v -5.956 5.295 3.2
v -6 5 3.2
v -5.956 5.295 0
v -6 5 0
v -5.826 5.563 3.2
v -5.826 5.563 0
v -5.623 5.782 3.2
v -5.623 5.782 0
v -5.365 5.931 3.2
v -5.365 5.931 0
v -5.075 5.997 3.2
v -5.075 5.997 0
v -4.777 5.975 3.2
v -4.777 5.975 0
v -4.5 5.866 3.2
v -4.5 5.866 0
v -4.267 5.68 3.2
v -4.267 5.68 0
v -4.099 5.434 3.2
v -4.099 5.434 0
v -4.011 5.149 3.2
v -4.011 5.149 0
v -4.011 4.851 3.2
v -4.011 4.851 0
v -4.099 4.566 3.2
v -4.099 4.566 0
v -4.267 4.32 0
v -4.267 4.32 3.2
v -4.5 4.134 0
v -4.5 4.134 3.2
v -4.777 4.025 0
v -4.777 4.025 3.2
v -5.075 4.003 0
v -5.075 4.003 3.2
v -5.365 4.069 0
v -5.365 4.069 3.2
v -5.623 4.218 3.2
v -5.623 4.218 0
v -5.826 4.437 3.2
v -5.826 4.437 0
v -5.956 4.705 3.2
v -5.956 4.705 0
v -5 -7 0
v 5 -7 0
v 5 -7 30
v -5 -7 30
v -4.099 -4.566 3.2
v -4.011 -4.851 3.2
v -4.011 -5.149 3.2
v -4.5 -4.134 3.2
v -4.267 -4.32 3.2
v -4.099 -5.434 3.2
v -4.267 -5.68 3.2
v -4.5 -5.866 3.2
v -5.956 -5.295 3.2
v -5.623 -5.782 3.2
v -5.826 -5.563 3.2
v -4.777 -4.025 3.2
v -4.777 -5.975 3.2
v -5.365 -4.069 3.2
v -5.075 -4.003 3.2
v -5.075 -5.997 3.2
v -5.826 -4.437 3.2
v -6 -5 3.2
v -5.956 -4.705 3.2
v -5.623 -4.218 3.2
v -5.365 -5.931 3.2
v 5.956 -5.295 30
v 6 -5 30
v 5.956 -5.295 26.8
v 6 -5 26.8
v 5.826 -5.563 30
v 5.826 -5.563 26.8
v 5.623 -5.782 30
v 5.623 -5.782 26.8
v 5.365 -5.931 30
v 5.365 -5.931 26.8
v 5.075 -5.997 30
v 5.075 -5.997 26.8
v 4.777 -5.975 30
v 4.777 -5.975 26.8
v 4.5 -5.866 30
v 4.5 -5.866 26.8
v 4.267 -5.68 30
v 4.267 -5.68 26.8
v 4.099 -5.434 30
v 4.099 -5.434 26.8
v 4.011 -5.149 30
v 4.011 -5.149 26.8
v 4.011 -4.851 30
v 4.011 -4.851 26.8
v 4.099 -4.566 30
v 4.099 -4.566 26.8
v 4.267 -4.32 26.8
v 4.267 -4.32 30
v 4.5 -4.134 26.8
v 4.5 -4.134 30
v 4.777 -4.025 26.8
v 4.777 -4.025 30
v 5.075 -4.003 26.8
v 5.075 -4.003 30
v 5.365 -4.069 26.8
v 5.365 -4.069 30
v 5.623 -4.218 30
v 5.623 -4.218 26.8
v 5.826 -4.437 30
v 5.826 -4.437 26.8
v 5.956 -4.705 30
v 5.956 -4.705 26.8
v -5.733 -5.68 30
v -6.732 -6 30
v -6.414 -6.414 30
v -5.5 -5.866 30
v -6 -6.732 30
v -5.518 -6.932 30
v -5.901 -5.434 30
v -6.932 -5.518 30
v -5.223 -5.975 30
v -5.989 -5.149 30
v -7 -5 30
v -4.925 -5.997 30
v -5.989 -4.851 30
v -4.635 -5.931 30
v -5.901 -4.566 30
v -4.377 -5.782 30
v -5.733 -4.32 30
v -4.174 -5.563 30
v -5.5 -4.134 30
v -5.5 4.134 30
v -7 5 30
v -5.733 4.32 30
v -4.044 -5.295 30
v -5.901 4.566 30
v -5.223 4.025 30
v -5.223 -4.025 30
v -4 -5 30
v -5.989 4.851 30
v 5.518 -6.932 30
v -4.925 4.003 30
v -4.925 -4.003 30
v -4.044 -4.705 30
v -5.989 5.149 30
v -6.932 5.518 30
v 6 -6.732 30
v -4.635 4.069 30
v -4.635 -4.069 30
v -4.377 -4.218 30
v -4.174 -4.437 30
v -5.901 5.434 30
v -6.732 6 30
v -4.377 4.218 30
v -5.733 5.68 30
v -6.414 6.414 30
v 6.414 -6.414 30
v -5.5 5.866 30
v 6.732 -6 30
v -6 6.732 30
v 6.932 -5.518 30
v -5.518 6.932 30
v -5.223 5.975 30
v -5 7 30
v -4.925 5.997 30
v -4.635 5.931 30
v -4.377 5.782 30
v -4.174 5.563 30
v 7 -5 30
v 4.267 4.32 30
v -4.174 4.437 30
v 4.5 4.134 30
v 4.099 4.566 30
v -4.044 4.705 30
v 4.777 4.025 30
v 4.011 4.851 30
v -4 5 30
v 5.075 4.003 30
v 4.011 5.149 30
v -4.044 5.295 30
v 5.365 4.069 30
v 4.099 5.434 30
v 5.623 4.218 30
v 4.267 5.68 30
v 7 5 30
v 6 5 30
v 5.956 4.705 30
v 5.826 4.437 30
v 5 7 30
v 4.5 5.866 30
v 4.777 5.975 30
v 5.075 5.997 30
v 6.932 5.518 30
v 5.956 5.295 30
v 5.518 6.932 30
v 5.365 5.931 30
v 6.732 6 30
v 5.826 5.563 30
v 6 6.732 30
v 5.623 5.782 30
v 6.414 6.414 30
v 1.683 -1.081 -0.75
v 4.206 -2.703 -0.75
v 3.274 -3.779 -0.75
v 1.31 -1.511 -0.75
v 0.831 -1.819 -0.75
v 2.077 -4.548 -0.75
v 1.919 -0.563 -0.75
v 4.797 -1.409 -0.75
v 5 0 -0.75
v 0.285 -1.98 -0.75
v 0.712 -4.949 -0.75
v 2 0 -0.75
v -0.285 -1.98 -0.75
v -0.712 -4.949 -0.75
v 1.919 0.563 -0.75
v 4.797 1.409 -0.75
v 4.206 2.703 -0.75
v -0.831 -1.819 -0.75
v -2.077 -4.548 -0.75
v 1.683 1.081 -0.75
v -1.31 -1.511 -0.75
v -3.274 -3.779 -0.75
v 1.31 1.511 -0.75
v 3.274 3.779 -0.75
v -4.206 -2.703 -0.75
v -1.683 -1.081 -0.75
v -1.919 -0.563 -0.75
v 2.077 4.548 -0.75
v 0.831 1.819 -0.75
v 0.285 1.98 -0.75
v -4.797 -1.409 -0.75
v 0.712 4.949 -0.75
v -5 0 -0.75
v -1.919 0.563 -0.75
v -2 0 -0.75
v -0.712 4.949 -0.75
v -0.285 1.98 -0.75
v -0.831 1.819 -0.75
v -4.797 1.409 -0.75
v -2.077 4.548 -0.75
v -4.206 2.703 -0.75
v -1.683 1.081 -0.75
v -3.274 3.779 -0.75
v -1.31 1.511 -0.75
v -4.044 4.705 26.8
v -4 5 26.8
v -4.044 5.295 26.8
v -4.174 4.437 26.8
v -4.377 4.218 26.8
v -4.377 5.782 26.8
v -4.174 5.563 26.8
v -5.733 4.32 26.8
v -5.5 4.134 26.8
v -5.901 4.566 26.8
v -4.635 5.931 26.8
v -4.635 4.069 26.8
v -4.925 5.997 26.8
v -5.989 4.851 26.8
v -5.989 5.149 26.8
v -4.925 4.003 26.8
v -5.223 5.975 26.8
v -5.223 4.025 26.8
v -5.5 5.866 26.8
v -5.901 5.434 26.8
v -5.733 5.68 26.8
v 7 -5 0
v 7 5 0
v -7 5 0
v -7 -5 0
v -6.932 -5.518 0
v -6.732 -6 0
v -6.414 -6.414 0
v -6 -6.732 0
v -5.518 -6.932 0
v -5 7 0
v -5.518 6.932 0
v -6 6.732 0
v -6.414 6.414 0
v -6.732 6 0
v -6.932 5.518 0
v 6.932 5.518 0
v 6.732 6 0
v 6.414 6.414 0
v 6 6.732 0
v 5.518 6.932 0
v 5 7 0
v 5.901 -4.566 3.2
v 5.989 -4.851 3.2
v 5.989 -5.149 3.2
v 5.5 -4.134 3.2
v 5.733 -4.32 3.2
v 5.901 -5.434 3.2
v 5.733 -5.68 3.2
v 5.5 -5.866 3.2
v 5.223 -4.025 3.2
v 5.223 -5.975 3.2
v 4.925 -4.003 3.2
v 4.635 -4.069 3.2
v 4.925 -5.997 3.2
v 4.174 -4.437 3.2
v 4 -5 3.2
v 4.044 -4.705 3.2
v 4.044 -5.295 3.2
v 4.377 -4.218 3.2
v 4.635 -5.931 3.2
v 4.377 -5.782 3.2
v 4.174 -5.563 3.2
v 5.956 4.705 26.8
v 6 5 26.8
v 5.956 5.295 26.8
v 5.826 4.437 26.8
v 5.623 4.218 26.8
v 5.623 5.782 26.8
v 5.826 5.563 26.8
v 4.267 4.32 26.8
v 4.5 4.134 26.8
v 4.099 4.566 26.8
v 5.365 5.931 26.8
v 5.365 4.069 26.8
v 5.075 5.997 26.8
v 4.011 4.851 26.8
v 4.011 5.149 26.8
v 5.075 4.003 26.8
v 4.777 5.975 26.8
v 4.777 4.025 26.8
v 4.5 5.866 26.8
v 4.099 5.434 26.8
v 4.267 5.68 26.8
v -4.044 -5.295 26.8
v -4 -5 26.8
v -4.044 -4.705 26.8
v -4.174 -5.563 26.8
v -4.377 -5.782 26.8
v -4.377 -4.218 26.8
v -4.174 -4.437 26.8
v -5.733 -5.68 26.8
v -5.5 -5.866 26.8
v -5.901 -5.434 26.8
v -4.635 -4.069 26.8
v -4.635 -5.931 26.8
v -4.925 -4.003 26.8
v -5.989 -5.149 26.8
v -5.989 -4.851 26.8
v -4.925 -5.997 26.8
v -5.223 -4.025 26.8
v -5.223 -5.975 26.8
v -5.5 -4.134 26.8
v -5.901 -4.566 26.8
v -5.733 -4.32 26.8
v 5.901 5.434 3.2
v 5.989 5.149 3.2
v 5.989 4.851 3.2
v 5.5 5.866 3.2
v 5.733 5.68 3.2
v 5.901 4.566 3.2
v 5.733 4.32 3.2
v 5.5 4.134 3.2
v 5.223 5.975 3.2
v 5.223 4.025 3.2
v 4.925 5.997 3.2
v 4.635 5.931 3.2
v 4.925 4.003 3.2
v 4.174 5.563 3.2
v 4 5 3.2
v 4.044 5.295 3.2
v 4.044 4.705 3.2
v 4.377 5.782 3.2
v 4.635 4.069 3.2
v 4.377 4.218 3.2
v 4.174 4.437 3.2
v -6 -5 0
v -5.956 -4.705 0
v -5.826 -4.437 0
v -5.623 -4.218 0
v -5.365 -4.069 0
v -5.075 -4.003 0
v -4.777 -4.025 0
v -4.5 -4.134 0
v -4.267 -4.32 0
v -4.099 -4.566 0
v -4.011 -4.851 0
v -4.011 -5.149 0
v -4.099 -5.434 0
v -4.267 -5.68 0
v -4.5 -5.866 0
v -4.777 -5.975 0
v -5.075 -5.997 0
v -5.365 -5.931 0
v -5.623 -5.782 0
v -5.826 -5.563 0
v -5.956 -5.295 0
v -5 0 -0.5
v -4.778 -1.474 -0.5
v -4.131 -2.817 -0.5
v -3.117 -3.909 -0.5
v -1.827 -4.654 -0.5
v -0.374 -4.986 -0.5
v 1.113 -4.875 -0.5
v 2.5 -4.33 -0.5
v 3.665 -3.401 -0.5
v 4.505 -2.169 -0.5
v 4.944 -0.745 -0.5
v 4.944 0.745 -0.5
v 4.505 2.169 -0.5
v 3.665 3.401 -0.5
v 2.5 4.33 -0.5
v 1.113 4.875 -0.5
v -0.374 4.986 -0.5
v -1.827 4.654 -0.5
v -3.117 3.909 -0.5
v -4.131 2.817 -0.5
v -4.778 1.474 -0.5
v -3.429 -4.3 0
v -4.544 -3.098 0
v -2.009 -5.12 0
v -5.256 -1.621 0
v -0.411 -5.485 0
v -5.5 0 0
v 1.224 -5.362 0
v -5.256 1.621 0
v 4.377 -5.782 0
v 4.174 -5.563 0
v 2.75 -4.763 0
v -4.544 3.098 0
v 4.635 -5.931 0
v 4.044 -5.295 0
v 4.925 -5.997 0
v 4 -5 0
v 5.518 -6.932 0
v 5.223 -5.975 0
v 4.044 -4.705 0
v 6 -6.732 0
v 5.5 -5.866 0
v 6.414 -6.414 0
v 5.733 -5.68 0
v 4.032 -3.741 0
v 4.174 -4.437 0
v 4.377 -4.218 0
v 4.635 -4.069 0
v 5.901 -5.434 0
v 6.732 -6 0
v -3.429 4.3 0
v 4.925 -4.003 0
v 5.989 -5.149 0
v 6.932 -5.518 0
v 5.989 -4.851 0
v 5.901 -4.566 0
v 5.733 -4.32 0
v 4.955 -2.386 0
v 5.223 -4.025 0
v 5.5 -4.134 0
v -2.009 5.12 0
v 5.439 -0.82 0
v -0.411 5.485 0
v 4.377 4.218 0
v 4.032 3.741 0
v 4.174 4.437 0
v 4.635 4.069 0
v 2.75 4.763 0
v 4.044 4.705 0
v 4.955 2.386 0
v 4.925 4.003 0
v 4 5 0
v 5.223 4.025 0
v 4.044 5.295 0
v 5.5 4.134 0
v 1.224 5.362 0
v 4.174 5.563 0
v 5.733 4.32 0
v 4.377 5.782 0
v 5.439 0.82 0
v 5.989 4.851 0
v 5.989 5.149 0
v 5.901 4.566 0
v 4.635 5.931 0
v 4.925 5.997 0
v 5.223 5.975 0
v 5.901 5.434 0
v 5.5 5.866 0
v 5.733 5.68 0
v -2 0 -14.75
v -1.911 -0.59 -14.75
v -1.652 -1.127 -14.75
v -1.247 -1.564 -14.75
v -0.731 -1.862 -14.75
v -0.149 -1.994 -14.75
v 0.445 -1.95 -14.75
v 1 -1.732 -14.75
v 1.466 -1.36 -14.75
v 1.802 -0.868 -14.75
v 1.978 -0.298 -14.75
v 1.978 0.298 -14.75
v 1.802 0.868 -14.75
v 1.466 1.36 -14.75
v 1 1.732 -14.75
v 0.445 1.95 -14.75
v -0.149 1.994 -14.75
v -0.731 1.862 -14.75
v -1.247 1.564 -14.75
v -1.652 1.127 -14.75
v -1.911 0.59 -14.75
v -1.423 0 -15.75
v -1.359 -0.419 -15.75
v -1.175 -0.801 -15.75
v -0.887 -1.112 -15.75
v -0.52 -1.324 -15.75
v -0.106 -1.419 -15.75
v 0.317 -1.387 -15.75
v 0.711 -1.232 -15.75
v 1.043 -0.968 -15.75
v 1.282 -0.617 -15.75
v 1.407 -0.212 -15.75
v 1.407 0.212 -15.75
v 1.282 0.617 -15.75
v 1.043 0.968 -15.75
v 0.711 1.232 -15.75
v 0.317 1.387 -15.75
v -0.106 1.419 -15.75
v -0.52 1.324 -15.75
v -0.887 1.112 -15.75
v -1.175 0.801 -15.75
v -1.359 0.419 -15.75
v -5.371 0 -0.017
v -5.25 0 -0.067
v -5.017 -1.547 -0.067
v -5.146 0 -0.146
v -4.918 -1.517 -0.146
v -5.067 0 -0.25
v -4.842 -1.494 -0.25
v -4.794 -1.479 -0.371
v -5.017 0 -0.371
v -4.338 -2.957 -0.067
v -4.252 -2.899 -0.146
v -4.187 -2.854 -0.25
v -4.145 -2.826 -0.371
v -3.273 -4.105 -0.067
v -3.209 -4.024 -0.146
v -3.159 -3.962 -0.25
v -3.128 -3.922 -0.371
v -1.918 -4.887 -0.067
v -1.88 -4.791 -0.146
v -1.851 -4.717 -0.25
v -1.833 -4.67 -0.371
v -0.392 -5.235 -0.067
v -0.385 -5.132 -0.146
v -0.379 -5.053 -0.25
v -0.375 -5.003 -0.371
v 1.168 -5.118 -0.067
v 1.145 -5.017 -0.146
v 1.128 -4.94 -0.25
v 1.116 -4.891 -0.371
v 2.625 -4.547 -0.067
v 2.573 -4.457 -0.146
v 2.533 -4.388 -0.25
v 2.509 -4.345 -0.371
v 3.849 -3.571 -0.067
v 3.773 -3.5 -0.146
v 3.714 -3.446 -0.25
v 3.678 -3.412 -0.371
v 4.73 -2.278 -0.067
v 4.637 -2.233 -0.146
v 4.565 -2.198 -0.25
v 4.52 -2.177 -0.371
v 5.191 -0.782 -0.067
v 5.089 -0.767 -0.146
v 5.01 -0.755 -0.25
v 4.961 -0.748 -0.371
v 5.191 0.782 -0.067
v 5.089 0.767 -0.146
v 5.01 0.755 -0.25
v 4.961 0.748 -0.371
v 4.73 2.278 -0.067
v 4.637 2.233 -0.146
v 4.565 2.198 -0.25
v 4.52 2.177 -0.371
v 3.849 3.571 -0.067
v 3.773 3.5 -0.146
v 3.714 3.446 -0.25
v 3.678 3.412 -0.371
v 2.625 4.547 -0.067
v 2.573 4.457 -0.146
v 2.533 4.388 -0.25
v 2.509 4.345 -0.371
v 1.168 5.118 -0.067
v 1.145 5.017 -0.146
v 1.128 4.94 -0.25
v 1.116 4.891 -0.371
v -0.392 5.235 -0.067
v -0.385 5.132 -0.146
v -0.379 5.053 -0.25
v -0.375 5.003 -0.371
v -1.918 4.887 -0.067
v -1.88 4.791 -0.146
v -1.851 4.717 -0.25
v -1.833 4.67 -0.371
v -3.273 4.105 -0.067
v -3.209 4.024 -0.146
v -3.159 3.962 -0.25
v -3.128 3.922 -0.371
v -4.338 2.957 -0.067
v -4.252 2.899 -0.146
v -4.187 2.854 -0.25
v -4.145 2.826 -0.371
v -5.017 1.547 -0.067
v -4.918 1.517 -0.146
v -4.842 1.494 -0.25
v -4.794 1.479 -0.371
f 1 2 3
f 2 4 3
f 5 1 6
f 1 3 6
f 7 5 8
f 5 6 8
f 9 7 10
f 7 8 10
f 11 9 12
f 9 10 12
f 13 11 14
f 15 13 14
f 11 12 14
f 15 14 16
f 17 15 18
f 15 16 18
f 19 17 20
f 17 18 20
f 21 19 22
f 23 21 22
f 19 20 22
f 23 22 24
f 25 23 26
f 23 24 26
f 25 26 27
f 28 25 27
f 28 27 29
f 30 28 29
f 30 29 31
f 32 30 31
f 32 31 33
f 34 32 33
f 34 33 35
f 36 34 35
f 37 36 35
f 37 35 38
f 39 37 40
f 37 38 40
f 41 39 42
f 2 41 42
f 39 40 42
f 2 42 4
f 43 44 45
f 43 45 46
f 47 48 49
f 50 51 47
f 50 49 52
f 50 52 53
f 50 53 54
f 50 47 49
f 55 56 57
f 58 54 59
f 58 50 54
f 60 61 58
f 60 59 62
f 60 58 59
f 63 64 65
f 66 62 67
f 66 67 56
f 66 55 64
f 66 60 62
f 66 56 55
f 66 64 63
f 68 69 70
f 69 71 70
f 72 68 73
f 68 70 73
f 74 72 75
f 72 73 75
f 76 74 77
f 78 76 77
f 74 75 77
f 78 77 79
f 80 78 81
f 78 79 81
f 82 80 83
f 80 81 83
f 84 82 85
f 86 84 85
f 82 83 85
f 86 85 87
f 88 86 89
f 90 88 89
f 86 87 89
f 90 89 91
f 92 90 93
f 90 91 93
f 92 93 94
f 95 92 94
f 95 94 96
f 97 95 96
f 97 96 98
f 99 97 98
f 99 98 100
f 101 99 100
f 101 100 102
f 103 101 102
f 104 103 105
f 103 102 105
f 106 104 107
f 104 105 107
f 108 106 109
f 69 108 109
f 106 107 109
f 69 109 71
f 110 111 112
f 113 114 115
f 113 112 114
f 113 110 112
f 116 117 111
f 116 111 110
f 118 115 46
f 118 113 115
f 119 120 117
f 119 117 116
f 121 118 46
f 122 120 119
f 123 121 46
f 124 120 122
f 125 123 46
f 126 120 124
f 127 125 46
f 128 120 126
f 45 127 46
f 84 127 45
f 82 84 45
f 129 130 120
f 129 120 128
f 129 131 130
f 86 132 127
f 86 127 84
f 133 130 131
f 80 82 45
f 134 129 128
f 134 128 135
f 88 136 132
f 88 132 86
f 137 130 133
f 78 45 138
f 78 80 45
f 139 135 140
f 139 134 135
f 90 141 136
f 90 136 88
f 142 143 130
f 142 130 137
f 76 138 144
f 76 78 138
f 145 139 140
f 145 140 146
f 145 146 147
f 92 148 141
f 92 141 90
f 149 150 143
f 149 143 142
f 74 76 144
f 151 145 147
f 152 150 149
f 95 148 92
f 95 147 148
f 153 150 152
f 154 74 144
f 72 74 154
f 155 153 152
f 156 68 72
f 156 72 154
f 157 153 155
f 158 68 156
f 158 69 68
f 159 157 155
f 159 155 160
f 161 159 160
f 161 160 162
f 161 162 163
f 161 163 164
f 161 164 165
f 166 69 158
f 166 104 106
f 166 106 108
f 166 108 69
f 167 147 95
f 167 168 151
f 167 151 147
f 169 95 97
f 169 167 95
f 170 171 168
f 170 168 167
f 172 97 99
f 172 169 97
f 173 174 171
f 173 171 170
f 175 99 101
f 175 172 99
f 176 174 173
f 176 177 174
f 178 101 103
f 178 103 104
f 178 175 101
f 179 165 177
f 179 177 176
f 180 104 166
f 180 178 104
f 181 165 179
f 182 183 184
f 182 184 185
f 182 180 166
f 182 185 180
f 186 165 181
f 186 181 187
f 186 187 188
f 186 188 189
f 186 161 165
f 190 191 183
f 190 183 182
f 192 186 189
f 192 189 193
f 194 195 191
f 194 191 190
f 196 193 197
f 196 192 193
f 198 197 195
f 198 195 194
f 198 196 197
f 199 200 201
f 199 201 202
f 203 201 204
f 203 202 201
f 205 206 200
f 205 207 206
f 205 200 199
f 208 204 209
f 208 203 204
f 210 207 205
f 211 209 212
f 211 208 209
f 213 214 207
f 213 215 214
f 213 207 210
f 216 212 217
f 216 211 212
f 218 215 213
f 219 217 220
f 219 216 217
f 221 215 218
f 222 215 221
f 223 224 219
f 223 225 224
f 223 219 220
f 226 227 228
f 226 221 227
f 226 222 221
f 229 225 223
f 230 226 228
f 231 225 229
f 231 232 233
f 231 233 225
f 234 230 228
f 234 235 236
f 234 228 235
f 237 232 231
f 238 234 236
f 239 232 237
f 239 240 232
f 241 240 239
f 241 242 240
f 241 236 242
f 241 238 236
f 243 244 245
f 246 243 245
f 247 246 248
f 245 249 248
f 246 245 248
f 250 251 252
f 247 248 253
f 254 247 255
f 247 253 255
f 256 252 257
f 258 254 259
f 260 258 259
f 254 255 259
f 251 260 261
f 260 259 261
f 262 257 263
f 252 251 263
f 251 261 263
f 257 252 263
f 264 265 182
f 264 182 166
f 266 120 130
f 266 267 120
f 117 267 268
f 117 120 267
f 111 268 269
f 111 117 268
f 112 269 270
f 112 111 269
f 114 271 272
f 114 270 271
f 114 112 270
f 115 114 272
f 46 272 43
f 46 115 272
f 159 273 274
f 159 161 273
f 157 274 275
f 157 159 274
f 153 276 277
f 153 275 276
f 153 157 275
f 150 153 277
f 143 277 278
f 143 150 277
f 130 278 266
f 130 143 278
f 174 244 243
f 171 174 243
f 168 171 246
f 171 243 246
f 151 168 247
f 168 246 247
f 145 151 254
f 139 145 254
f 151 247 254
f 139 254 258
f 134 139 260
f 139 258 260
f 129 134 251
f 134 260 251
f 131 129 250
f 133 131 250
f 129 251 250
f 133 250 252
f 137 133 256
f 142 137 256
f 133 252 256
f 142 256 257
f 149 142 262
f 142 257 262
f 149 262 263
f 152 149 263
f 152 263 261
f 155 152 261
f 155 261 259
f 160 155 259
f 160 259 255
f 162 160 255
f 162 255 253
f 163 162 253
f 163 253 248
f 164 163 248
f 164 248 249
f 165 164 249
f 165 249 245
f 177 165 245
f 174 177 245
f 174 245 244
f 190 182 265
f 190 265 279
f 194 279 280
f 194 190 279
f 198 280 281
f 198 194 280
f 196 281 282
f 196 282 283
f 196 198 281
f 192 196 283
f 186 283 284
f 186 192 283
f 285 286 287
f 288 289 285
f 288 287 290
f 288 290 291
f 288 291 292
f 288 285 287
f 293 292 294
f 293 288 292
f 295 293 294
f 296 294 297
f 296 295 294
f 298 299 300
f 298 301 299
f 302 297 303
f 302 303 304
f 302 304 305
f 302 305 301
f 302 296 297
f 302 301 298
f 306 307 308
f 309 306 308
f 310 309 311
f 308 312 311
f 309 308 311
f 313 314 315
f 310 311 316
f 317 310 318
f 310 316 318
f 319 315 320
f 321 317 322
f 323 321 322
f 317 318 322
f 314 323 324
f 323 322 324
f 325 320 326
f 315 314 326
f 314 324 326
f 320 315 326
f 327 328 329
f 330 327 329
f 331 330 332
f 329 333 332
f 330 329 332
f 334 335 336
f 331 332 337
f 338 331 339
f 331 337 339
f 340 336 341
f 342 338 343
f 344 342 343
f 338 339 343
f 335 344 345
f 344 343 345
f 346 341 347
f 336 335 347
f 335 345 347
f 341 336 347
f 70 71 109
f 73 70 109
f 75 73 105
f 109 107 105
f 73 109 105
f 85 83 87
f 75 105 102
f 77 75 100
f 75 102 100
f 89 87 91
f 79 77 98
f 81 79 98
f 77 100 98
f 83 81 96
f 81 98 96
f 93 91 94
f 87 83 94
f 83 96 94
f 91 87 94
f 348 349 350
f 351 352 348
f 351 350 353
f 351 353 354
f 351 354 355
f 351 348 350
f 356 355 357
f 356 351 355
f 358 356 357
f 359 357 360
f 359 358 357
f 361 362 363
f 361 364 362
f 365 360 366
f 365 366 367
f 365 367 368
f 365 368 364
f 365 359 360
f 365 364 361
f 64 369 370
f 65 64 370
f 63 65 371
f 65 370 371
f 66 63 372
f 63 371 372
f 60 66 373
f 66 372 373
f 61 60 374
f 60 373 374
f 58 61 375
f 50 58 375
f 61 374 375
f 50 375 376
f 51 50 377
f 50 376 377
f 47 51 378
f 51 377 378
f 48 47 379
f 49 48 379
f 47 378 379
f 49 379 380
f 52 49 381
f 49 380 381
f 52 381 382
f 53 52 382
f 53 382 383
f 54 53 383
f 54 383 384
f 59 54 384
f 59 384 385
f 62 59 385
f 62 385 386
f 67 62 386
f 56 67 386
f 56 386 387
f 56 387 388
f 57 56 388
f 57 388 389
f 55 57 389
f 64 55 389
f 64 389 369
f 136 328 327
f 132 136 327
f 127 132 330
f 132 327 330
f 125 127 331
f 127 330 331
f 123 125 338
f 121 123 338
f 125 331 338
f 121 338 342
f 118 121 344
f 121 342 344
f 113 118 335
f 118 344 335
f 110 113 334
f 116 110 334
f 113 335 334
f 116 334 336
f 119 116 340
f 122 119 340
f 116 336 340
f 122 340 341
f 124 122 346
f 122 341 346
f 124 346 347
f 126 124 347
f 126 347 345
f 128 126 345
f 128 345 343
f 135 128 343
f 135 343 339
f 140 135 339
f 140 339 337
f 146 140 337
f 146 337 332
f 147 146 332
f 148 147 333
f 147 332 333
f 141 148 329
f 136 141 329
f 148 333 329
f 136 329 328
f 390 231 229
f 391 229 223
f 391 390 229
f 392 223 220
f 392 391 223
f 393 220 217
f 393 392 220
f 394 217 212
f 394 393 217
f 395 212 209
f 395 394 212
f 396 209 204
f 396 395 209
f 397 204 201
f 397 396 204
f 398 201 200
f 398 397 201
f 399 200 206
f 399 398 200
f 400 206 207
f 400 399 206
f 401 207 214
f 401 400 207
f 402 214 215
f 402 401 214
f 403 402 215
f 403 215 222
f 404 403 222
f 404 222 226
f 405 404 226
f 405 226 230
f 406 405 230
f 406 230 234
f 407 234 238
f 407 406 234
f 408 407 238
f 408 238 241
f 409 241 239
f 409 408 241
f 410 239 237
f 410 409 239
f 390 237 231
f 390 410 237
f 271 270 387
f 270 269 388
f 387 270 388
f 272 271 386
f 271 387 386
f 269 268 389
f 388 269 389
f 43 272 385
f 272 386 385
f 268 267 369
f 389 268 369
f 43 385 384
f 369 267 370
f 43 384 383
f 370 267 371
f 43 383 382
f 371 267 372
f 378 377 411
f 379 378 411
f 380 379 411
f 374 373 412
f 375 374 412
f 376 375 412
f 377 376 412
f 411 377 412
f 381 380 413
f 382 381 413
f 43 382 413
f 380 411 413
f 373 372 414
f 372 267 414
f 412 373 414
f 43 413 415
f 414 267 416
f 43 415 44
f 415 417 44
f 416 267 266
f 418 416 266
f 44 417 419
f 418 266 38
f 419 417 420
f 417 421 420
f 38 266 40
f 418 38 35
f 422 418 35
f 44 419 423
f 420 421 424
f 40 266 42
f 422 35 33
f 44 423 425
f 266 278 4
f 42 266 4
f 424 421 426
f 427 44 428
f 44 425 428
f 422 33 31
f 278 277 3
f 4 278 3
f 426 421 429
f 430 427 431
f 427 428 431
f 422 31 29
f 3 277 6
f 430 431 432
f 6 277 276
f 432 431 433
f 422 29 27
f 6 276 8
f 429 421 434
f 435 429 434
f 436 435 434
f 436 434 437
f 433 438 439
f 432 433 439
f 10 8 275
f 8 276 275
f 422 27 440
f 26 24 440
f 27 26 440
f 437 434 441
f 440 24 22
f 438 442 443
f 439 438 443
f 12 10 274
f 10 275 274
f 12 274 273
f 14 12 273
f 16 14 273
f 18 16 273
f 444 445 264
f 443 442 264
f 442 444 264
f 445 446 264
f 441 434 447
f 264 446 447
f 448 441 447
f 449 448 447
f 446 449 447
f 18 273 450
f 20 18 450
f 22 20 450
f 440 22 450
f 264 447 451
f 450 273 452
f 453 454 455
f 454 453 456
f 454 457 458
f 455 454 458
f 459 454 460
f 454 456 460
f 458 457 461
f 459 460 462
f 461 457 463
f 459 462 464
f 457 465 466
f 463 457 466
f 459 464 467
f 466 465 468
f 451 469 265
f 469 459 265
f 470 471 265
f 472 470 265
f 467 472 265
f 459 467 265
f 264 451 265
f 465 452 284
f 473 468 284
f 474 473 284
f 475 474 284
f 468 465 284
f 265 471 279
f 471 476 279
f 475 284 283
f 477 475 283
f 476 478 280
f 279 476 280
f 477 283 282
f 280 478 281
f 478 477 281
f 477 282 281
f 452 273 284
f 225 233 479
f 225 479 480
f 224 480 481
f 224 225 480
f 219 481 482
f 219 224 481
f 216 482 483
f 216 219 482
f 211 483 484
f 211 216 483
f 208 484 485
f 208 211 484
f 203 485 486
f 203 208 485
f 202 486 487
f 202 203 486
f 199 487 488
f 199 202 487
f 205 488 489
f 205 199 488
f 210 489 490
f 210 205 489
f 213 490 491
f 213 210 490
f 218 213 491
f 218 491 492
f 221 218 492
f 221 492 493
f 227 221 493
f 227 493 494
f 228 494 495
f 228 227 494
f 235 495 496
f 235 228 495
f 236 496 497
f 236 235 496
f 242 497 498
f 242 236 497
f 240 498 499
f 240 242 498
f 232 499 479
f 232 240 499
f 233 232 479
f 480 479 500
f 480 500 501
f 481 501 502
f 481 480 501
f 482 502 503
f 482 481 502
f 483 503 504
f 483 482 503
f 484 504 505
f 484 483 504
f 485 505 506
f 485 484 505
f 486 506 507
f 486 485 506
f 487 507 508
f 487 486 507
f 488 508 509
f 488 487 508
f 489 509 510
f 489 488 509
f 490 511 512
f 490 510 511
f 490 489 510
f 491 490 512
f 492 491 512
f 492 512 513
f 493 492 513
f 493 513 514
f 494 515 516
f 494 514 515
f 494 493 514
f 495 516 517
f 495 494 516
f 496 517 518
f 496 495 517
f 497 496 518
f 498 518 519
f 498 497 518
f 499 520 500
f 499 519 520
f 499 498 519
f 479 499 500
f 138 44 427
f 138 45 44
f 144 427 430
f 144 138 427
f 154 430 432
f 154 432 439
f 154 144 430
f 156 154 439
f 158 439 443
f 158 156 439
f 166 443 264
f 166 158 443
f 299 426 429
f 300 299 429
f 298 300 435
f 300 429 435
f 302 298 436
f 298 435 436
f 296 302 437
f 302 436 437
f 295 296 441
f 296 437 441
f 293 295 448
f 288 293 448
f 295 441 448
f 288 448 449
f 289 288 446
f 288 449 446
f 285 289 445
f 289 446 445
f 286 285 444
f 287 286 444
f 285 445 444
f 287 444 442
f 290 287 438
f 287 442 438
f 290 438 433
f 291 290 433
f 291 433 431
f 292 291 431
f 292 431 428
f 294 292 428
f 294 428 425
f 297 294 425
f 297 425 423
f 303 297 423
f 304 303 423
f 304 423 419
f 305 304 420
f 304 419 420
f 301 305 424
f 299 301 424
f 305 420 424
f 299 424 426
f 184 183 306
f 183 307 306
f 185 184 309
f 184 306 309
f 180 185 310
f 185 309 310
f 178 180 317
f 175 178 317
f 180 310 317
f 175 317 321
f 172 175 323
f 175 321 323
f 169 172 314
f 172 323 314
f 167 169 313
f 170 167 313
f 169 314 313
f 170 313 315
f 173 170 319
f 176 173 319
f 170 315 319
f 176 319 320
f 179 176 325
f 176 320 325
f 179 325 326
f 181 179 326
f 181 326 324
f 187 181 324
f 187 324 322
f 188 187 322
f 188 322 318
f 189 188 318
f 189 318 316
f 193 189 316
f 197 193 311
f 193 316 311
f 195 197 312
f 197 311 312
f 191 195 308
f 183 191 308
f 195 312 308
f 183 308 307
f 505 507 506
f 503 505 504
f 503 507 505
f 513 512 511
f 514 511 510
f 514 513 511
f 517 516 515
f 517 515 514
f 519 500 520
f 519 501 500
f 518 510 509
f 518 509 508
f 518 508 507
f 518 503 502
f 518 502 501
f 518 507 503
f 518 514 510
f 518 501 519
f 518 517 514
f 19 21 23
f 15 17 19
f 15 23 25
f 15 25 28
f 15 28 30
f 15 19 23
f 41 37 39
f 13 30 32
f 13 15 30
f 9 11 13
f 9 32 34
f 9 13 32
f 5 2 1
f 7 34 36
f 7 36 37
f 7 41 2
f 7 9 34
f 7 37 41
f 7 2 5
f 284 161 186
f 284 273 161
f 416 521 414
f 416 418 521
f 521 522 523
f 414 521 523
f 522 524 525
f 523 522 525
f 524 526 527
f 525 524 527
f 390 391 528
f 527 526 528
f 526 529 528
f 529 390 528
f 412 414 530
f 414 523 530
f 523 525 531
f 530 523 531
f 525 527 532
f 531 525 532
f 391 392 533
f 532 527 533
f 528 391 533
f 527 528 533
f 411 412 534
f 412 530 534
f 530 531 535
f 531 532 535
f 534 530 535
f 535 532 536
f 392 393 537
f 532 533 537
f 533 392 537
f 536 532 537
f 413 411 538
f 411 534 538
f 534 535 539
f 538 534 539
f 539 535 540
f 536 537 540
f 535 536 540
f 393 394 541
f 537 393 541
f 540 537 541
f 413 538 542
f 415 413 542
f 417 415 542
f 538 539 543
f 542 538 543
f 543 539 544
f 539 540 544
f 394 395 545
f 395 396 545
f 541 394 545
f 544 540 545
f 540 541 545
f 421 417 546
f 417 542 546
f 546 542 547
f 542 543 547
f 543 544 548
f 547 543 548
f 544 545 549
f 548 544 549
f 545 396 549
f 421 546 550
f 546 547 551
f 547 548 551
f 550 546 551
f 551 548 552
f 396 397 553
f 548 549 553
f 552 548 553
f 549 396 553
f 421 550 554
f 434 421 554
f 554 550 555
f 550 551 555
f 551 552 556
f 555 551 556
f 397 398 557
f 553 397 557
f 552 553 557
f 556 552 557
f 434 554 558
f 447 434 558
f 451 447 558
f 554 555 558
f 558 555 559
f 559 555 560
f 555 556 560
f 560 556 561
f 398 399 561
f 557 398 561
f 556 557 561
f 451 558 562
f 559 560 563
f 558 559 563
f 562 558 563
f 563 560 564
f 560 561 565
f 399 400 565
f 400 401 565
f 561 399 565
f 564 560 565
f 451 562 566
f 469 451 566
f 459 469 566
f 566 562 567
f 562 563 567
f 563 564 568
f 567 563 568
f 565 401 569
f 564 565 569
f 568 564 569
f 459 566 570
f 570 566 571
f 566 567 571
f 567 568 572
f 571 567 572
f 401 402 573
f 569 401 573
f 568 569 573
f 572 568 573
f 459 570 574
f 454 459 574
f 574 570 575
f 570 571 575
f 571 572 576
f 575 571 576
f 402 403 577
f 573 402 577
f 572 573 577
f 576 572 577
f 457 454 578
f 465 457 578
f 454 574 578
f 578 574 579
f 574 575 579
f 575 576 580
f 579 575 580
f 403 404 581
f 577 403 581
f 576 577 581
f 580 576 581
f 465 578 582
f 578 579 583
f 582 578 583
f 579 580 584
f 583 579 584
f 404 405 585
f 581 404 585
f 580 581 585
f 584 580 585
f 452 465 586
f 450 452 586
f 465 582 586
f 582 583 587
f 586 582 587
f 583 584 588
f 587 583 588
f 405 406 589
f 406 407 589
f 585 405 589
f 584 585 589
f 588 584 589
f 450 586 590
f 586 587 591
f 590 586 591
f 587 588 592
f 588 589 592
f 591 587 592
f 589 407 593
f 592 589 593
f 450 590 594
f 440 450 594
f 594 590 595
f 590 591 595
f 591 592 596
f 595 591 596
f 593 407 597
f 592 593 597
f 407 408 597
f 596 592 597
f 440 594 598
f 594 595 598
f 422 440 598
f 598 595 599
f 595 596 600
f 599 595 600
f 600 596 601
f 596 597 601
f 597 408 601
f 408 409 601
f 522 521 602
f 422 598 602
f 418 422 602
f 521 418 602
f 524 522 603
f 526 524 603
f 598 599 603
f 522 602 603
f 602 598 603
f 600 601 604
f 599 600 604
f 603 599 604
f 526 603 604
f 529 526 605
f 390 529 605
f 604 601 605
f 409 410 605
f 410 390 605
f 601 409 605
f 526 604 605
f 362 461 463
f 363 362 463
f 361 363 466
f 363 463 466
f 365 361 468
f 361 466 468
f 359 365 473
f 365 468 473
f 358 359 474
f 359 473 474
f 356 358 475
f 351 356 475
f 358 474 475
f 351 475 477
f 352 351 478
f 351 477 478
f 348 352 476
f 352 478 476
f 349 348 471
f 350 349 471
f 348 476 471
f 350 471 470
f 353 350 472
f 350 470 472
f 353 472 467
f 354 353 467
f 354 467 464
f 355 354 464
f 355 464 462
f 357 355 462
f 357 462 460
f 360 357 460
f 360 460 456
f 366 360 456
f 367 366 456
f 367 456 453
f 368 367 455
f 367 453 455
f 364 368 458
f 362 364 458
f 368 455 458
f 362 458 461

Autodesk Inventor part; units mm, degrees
ref_plane "YZ Plane" through (0, 0, 0) normal (1, 0, 0) x (0, 1, 0)
ref_plane "XZ Plane" through (0, 0, 0) normal (0, 1, 0) x (-1, 0, 0)
ref_plane "XY Plane" through (0, 0, 0) normal (0, 0, 1) x (1, 0, 0)
sketch "Szkic1" plane through (0, 0, 0) normal (0, 0, 1) x (1, 0, 0)
  line L0 (7, -7) -> (-7, -7)
  line L1 (-7, -7) -> (-7, 7)
  line L2 (-7, 7) -> (7, 7)
  line L3 (7, 7) -> (7, -7)
  line L4 (7, -7) -> (-7, 7) construction
  line L5 (-7, -7) -> (7, 7) construction
  line L6 (0, 0) -> (-5.75, 0)
  line L7 (-7, 5.75) -> (-5, 5.75)
  line L8 (-5, 7) -> (-5, 5)
  line L9 (-5, 5) -> (5, 5)
  line L10 (5, 5) -> (5, -5)
  line L11 (5, -5) -> (-5, -5)
  line L12 (-5, -5) -> (-5, 5)
  circle A0 centre (-5, 5) radius 1
  circle A1 centre (5, 5) radius 1
  circle A2 centre (5, -5) radius 1
  circle A3 centre (-5, -5) radius 1
  circle A4 centre (0, 0) radius 5
  circle A5 centre (0, 0) radius 5.5
  circle A6 centre (0, 0) radius 2
  circle A7 centre (0, 0) radius 2.1
  dimension "d0" = 14
  dimension "d1" = 14
  dimension "d8" = 2
  dimension "d9" = 2
  dimension "d13" = 10
  dimension "d14" = 10
  dimension "d15" = 10
  dimension "d17" = 2
  dimension "d18" = 2
  dimension "d19" = 2
  dimension "d20" = 2
  dimension "d21" = 11
  dimension "d22" = 4
  dimension "d23" = 4.2
extrude "Wyciągnięcie proste1" add sketch "Szkic1" along normal blind 30 contours L0 L1 L7 A0 L12 A5 A3 L11 A2 L10 A1 L9 L8 L2 L3 | L1 L2 L8 A0 L7 | A0 L9 A5 L12 | A5 L9 A4 L12 | L12 L6 A5 | A5 L9 | A6 | A7 | L12 A5 L6 | A4 L11 A5 L12 | A4 | L9 A5 L10 A4 | L9 A1 L10 A5 | A5 L11 A3 L12 | A4 L10 A5 L11 | L11 A5 | L10 A5 | A5 L10 A2 L11
sketch "Szkic2" plane through (0, 0, 0) normal (0, 0, -1) x (-1, 0, 0)
  line L0 (7, -7) -> (-7, -7)
  line L1 (-7, -7) -> (-7, 7)
  line L2 (-7, 7) -> (7, 7)
  line L3 (7, 7) -> (7, -7)
  line L4 (7, -7) -> (-7, 7) construction
  line L5 (-7, -7) -> (7, 7) construction
  line L6 (0, 0) -> (-5.75, 0)
  line L7 (-7, 5.75) -> (-5, 5.75)
  line L8 (-5, 7) -> (-5, 5)
  line L9 (-5, 5) -> (5, 5)
  line L10 (5, 5) -> (5, -5)
  line L11 (5, -5) -> (-5, -5)
  line L12 (-5, -5) -> (-5, 5)
  circle A0 centre (-5, 5) radius 1
  circle A1 centre (5, 5) radius 1
  circle A2 centre (5, -5) radius 1
  circle A3 centre (-5, -5) radius 1
  circle A4 centre (0, 0) radius 5
  circle A5 centre (0, 0) radius 5.5
  circle A6 centre (0, 0) radius 2
  circle A7 centre (0, 0) radius 2.1
  dimension "d26" = 14
  dimension "d27" = 14
  dimension "d28" = 2
  dimension "d29" = 2
  dimension "d30" = 10
  dimension "d31" = 10
  dimension "d32" = 10
  dimension "d33" = 2
  dimension "d34" = 2
  dimension "d35" = 2
  dimension "d36" = 2
  dimension "d37" = 11
  dimension "d38" = 4
  dimension "d39" = 4.2
extrude "Wyciągnięcie proste2" add sketch "Szkic2" along normal blind 0.75 contours A6 | A7 | A4
fillet "Zaokrąglenie1" radius 2 4 edges at (-7, 7, 15) (7, 7, 15) (7, -7, 15) (-7, -7, 15)
fillet "Zaokrąglenie2" radius 0.5 1 edges at (5, 0, 0)
sketch "Szkic3" plane through (0, 0, -0.75) normal (0, 0, -1) x (-1, 0, 0)
  circle A0 centre (0, 0) radius 2
  dimension "d44" = 4
extrude "Wyciągnięcie proste3" add sketch "Szkic3" along normal blind 15
chamfer "Faza1" distance 1 angle 30 1 edges at (2, 0, -15.75) measured on face at (-1.9935, -0.1609, -10.75)
sketch "Szkic4" plane through (0, 0, 0) normal (0, 0, -1) x (-1, 0, 0)
  circle A0 centre (-5, 5) radius 1 projected
  circle A1 centre (-5, 5) radius 1
  circle A2 centre (5, 5) radius 1 projected
  circle A3 centre (5, 5) radius 1
  circle A4 centre (5, -5) radius 1 projected
  circle A5 centre (5, -5) radius 1
  circle A6 centre (-5, -5) radius 1
  point P0 (0, 0)
extrude "Wyciągnięcie proste4" add sketch "Szkic4" against normal blind 26.8
sketch "Szkic5" plane through (0, 0, 0) normal (0, 0, -1) x (-1, 0, 0)
  circle A0 centre (-5, 5) radius 1 projected
  circle A1 centre (-5, 5) radius 1
  circle A2 centre (5, 5) radius 1 projected
  circle A3 centre (5, 5) radius 1
  circle A4 centre (5, -5) radius 1 projected
  circle A5 centre (5, -5) radius 1
  circle A6 centre (-5, -5) radius 1 projected
  circle A7 centre (-5, -5) radius 1
  point P0 (0, 0)
extrude "Wyciągnięcie proste5" cut sketch "Szkic5" against normal blind 3.2
properties part number "Silnik krokowy"
